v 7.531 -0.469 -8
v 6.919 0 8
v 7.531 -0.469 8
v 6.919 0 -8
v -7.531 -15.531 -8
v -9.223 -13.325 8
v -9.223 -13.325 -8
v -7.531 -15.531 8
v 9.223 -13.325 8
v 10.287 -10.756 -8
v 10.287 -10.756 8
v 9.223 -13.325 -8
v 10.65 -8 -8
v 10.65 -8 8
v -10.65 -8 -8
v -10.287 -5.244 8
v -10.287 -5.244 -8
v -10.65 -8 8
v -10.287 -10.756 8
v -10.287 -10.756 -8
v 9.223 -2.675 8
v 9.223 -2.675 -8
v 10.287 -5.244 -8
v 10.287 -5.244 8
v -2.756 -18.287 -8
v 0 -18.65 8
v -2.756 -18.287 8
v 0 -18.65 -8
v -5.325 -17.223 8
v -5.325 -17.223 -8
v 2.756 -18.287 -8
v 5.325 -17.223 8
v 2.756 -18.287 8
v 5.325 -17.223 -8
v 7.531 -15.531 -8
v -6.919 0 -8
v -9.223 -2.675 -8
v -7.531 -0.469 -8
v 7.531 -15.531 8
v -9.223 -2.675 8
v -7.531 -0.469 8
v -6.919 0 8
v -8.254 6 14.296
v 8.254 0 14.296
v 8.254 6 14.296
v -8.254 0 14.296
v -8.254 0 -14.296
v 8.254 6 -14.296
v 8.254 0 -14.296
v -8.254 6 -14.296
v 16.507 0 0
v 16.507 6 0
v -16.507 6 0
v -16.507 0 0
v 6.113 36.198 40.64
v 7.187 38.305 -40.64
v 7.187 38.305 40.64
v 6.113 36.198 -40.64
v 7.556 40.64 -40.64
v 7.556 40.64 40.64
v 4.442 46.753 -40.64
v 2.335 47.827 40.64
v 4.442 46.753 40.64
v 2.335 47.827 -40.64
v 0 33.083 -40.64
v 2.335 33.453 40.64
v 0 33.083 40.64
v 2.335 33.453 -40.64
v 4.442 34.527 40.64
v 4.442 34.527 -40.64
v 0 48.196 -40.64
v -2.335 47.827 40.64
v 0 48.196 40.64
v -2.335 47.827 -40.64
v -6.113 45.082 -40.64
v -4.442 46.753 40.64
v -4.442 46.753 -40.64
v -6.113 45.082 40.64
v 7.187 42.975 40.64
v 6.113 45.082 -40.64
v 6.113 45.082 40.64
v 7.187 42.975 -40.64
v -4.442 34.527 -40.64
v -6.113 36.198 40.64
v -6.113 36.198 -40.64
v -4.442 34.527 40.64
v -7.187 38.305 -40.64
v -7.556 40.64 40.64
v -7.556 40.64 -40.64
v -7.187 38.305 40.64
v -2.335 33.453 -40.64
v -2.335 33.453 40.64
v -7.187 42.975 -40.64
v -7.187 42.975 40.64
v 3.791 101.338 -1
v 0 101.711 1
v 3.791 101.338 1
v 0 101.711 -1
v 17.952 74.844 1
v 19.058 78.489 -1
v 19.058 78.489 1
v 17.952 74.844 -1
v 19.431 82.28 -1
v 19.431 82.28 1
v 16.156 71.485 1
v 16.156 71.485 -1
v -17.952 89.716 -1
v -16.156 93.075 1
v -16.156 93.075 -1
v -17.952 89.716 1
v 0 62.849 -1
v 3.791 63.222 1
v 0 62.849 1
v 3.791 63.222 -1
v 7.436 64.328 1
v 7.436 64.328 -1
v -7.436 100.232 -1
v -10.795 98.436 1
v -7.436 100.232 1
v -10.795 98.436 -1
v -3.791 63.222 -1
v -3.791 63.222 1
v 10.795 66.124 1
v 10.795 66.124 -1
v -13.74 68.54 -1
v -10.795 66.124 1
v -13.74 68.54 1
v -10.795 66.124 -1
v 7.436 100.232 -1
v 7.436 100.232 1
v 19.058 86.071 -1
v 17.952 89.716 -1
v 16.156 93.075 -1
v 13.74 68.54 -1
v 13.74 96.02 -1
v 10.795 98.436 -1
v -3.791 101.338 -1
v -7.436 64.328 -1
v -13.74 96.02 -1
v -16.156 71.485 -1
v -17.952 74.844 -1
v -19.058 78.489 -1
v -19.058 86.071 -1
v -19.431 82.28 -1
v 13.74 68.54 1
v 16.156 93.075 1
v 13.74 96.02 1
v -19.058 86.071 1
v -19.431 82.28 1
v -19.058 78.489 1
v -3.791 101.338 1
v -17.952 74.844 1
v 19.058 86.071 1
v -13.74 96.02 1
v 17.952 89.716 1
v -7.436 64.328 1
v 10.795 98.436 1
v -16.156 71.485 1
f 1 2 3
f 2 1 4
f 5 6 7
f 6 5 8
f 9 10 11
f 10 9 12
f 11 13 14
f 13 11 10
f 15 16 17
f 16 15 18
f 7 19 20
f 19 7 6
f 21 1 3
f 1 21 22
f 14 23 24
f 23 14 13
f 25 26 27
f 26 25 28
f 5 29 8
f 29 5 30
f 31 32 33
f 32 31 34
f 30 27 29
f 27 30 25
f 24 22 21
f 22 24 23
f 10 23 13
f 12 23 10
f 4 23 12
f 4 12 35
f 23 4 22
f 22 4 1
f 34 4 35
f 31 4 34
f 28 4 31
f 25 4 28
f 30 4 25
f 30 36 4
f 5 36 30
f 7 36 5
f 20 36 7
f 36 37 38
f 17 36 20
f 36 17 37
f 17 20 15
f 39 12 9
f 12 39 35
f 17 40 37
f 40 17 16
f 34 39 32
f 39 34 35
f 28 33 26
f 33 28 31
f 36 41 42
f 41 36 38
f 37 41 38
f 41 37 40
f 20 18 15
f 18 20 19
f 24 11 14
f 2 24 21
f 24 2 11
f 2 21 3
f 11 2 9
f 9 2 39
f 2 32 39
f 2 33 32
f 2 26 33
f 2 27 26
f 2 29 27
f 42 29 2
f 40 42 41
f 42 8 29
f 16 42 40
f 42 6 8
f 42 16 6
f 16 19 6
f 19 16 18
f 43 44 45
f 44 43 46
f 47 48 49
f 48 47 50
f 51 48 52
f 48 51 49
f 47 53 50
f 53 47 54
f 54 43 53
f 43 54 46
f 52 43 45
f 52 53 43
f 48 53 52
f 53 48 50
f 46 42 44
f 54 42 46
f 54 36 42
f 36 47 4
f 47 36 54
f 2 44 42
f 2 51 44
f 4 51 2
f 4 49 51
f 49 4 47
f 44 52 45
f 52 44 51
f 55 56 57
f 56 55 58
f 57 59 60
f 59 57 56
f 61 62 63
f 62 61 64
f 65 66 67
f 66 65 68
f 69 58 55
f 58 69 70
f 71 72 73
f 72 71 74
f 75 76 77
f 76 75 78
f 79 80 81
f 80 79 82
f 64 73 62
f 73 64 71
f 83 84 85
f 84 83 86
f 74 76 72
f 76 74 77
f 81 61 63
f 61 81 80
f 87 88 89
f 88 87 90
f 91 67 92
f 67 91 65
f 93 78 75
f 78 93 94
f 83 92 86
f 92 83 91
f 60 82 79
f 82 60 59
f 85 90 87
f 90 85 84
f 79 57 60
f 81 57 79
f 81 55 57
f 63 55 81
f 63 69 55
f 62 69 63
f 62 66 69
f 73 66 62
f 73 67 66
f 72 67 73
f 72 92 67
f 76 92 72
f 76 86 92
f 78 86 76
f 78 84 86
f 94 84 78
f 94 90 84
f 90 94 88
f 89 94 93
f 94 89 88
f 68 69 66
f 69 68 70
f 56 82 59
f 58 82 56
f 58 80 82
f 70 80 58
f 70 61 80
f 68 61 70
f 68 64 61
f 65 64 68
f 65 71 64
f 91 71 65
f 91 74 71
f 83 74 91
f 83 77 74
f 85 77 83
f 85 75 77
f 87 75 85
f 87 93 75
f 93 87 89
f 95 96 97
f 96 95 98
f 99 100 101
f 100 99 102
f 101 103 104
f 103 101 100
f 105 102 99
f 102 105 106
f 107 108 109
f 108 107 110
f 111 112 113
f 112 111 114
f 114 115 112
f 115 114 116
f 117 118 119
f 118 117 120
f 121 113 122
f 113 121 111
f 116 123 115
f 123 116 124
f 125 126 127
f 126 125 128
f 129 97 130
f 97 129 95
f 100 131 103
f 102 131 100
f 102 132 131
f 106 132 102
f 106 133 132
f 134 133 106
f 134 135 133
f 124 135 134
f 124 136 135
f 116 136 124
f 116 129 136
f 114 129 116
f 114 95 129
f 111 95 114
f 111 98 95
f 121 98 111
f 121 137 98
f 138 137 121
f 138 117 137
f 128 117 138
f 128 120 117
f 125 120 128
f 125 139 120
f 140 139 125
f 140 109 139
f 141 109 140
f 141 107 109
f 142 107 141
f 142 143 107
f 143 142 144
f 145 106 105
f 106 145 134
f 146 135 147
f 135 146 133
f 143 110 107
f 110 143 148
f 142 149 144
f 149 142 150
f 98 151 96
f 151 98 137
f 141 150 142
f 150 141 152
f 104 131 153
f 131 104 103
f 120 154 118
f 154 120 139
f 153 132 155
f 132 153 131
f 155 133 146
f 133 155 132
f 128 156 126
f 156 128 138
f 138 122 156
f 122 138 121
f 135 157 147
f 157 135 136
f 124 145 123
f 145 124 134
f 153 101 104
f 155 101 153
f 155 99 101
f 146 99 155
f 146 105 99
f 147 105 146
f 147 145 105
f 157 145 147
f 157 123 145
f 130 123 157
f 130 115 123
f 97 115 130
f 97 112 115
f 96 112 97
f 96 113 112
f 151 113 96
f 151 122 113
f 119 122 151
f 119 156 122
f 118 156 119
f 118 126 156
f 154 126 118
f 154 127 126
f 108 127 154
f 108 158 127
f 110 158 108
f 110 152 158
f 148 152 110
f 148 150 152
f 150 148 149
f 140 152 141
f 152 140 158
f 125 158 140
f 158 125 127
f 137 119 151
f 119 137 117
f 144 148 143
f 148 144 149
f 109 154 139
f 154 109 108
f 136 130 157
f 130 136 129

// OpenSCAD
// Auto-generated by scripts/author_from_manifest.py (Phase D.3).
// Source: data/phase_d_manifest.json (sku_intent='viking-vk530-esfr-upright-k252-214f').
// Do not hand-edit — regenerate from the manifest.
//
// @part viking_vk530_esfr_upright_k252_214f
// @kind sprinkler_head
// @category head.upright.k252
// @display-name "Viking VK530 ESFR Upright K25.2 214°F"
// @mfg viking_group
// @mfg-pn VK530
// @listing UL FM
// @hazard-classes ESFR
// @price-usd 88.00
// @install-minutes 14
// @crew journeyman
// @k-factor 25.2
// @orientation upright
// @response quick
// @temperature 214F
// @param size_in number default=0.5 label="Size" unit="in"
// @port inlet position=[0,0.014,0] direction=[0,1,0] style=NPT_threaded size_in=1 role=drop

size_in = 0.5;
k_factor = 25.2;

length_mm   = 81.28;
body_dia_mm = 43.18;
thread_od   = 21.3;
thread_len  = 16;
deflector_d = body_dia_mm * 0.9;

rotate([180,0,0]) union() {
    translate([0, thread_len/2, 0])
        cylinder(h = thread_len, d = thread_od, center = true, $fn = 24);
    translate([0, -3, 0])
        rotate([90, 0, 0])
        cylinder(h = 6, d = thread_od * 1.55, $fn = 6, center = true);
    translate([0, -length_mm/2, 0])
        cylinder(h = length_mm, d = body_dia_mm * 0.35, center = true, $fn = 20);
    translate([0, -length_mm - 1, 0])
        cylinder(h = 2, d = deflector_d, center = true, $fn = 32);
}
